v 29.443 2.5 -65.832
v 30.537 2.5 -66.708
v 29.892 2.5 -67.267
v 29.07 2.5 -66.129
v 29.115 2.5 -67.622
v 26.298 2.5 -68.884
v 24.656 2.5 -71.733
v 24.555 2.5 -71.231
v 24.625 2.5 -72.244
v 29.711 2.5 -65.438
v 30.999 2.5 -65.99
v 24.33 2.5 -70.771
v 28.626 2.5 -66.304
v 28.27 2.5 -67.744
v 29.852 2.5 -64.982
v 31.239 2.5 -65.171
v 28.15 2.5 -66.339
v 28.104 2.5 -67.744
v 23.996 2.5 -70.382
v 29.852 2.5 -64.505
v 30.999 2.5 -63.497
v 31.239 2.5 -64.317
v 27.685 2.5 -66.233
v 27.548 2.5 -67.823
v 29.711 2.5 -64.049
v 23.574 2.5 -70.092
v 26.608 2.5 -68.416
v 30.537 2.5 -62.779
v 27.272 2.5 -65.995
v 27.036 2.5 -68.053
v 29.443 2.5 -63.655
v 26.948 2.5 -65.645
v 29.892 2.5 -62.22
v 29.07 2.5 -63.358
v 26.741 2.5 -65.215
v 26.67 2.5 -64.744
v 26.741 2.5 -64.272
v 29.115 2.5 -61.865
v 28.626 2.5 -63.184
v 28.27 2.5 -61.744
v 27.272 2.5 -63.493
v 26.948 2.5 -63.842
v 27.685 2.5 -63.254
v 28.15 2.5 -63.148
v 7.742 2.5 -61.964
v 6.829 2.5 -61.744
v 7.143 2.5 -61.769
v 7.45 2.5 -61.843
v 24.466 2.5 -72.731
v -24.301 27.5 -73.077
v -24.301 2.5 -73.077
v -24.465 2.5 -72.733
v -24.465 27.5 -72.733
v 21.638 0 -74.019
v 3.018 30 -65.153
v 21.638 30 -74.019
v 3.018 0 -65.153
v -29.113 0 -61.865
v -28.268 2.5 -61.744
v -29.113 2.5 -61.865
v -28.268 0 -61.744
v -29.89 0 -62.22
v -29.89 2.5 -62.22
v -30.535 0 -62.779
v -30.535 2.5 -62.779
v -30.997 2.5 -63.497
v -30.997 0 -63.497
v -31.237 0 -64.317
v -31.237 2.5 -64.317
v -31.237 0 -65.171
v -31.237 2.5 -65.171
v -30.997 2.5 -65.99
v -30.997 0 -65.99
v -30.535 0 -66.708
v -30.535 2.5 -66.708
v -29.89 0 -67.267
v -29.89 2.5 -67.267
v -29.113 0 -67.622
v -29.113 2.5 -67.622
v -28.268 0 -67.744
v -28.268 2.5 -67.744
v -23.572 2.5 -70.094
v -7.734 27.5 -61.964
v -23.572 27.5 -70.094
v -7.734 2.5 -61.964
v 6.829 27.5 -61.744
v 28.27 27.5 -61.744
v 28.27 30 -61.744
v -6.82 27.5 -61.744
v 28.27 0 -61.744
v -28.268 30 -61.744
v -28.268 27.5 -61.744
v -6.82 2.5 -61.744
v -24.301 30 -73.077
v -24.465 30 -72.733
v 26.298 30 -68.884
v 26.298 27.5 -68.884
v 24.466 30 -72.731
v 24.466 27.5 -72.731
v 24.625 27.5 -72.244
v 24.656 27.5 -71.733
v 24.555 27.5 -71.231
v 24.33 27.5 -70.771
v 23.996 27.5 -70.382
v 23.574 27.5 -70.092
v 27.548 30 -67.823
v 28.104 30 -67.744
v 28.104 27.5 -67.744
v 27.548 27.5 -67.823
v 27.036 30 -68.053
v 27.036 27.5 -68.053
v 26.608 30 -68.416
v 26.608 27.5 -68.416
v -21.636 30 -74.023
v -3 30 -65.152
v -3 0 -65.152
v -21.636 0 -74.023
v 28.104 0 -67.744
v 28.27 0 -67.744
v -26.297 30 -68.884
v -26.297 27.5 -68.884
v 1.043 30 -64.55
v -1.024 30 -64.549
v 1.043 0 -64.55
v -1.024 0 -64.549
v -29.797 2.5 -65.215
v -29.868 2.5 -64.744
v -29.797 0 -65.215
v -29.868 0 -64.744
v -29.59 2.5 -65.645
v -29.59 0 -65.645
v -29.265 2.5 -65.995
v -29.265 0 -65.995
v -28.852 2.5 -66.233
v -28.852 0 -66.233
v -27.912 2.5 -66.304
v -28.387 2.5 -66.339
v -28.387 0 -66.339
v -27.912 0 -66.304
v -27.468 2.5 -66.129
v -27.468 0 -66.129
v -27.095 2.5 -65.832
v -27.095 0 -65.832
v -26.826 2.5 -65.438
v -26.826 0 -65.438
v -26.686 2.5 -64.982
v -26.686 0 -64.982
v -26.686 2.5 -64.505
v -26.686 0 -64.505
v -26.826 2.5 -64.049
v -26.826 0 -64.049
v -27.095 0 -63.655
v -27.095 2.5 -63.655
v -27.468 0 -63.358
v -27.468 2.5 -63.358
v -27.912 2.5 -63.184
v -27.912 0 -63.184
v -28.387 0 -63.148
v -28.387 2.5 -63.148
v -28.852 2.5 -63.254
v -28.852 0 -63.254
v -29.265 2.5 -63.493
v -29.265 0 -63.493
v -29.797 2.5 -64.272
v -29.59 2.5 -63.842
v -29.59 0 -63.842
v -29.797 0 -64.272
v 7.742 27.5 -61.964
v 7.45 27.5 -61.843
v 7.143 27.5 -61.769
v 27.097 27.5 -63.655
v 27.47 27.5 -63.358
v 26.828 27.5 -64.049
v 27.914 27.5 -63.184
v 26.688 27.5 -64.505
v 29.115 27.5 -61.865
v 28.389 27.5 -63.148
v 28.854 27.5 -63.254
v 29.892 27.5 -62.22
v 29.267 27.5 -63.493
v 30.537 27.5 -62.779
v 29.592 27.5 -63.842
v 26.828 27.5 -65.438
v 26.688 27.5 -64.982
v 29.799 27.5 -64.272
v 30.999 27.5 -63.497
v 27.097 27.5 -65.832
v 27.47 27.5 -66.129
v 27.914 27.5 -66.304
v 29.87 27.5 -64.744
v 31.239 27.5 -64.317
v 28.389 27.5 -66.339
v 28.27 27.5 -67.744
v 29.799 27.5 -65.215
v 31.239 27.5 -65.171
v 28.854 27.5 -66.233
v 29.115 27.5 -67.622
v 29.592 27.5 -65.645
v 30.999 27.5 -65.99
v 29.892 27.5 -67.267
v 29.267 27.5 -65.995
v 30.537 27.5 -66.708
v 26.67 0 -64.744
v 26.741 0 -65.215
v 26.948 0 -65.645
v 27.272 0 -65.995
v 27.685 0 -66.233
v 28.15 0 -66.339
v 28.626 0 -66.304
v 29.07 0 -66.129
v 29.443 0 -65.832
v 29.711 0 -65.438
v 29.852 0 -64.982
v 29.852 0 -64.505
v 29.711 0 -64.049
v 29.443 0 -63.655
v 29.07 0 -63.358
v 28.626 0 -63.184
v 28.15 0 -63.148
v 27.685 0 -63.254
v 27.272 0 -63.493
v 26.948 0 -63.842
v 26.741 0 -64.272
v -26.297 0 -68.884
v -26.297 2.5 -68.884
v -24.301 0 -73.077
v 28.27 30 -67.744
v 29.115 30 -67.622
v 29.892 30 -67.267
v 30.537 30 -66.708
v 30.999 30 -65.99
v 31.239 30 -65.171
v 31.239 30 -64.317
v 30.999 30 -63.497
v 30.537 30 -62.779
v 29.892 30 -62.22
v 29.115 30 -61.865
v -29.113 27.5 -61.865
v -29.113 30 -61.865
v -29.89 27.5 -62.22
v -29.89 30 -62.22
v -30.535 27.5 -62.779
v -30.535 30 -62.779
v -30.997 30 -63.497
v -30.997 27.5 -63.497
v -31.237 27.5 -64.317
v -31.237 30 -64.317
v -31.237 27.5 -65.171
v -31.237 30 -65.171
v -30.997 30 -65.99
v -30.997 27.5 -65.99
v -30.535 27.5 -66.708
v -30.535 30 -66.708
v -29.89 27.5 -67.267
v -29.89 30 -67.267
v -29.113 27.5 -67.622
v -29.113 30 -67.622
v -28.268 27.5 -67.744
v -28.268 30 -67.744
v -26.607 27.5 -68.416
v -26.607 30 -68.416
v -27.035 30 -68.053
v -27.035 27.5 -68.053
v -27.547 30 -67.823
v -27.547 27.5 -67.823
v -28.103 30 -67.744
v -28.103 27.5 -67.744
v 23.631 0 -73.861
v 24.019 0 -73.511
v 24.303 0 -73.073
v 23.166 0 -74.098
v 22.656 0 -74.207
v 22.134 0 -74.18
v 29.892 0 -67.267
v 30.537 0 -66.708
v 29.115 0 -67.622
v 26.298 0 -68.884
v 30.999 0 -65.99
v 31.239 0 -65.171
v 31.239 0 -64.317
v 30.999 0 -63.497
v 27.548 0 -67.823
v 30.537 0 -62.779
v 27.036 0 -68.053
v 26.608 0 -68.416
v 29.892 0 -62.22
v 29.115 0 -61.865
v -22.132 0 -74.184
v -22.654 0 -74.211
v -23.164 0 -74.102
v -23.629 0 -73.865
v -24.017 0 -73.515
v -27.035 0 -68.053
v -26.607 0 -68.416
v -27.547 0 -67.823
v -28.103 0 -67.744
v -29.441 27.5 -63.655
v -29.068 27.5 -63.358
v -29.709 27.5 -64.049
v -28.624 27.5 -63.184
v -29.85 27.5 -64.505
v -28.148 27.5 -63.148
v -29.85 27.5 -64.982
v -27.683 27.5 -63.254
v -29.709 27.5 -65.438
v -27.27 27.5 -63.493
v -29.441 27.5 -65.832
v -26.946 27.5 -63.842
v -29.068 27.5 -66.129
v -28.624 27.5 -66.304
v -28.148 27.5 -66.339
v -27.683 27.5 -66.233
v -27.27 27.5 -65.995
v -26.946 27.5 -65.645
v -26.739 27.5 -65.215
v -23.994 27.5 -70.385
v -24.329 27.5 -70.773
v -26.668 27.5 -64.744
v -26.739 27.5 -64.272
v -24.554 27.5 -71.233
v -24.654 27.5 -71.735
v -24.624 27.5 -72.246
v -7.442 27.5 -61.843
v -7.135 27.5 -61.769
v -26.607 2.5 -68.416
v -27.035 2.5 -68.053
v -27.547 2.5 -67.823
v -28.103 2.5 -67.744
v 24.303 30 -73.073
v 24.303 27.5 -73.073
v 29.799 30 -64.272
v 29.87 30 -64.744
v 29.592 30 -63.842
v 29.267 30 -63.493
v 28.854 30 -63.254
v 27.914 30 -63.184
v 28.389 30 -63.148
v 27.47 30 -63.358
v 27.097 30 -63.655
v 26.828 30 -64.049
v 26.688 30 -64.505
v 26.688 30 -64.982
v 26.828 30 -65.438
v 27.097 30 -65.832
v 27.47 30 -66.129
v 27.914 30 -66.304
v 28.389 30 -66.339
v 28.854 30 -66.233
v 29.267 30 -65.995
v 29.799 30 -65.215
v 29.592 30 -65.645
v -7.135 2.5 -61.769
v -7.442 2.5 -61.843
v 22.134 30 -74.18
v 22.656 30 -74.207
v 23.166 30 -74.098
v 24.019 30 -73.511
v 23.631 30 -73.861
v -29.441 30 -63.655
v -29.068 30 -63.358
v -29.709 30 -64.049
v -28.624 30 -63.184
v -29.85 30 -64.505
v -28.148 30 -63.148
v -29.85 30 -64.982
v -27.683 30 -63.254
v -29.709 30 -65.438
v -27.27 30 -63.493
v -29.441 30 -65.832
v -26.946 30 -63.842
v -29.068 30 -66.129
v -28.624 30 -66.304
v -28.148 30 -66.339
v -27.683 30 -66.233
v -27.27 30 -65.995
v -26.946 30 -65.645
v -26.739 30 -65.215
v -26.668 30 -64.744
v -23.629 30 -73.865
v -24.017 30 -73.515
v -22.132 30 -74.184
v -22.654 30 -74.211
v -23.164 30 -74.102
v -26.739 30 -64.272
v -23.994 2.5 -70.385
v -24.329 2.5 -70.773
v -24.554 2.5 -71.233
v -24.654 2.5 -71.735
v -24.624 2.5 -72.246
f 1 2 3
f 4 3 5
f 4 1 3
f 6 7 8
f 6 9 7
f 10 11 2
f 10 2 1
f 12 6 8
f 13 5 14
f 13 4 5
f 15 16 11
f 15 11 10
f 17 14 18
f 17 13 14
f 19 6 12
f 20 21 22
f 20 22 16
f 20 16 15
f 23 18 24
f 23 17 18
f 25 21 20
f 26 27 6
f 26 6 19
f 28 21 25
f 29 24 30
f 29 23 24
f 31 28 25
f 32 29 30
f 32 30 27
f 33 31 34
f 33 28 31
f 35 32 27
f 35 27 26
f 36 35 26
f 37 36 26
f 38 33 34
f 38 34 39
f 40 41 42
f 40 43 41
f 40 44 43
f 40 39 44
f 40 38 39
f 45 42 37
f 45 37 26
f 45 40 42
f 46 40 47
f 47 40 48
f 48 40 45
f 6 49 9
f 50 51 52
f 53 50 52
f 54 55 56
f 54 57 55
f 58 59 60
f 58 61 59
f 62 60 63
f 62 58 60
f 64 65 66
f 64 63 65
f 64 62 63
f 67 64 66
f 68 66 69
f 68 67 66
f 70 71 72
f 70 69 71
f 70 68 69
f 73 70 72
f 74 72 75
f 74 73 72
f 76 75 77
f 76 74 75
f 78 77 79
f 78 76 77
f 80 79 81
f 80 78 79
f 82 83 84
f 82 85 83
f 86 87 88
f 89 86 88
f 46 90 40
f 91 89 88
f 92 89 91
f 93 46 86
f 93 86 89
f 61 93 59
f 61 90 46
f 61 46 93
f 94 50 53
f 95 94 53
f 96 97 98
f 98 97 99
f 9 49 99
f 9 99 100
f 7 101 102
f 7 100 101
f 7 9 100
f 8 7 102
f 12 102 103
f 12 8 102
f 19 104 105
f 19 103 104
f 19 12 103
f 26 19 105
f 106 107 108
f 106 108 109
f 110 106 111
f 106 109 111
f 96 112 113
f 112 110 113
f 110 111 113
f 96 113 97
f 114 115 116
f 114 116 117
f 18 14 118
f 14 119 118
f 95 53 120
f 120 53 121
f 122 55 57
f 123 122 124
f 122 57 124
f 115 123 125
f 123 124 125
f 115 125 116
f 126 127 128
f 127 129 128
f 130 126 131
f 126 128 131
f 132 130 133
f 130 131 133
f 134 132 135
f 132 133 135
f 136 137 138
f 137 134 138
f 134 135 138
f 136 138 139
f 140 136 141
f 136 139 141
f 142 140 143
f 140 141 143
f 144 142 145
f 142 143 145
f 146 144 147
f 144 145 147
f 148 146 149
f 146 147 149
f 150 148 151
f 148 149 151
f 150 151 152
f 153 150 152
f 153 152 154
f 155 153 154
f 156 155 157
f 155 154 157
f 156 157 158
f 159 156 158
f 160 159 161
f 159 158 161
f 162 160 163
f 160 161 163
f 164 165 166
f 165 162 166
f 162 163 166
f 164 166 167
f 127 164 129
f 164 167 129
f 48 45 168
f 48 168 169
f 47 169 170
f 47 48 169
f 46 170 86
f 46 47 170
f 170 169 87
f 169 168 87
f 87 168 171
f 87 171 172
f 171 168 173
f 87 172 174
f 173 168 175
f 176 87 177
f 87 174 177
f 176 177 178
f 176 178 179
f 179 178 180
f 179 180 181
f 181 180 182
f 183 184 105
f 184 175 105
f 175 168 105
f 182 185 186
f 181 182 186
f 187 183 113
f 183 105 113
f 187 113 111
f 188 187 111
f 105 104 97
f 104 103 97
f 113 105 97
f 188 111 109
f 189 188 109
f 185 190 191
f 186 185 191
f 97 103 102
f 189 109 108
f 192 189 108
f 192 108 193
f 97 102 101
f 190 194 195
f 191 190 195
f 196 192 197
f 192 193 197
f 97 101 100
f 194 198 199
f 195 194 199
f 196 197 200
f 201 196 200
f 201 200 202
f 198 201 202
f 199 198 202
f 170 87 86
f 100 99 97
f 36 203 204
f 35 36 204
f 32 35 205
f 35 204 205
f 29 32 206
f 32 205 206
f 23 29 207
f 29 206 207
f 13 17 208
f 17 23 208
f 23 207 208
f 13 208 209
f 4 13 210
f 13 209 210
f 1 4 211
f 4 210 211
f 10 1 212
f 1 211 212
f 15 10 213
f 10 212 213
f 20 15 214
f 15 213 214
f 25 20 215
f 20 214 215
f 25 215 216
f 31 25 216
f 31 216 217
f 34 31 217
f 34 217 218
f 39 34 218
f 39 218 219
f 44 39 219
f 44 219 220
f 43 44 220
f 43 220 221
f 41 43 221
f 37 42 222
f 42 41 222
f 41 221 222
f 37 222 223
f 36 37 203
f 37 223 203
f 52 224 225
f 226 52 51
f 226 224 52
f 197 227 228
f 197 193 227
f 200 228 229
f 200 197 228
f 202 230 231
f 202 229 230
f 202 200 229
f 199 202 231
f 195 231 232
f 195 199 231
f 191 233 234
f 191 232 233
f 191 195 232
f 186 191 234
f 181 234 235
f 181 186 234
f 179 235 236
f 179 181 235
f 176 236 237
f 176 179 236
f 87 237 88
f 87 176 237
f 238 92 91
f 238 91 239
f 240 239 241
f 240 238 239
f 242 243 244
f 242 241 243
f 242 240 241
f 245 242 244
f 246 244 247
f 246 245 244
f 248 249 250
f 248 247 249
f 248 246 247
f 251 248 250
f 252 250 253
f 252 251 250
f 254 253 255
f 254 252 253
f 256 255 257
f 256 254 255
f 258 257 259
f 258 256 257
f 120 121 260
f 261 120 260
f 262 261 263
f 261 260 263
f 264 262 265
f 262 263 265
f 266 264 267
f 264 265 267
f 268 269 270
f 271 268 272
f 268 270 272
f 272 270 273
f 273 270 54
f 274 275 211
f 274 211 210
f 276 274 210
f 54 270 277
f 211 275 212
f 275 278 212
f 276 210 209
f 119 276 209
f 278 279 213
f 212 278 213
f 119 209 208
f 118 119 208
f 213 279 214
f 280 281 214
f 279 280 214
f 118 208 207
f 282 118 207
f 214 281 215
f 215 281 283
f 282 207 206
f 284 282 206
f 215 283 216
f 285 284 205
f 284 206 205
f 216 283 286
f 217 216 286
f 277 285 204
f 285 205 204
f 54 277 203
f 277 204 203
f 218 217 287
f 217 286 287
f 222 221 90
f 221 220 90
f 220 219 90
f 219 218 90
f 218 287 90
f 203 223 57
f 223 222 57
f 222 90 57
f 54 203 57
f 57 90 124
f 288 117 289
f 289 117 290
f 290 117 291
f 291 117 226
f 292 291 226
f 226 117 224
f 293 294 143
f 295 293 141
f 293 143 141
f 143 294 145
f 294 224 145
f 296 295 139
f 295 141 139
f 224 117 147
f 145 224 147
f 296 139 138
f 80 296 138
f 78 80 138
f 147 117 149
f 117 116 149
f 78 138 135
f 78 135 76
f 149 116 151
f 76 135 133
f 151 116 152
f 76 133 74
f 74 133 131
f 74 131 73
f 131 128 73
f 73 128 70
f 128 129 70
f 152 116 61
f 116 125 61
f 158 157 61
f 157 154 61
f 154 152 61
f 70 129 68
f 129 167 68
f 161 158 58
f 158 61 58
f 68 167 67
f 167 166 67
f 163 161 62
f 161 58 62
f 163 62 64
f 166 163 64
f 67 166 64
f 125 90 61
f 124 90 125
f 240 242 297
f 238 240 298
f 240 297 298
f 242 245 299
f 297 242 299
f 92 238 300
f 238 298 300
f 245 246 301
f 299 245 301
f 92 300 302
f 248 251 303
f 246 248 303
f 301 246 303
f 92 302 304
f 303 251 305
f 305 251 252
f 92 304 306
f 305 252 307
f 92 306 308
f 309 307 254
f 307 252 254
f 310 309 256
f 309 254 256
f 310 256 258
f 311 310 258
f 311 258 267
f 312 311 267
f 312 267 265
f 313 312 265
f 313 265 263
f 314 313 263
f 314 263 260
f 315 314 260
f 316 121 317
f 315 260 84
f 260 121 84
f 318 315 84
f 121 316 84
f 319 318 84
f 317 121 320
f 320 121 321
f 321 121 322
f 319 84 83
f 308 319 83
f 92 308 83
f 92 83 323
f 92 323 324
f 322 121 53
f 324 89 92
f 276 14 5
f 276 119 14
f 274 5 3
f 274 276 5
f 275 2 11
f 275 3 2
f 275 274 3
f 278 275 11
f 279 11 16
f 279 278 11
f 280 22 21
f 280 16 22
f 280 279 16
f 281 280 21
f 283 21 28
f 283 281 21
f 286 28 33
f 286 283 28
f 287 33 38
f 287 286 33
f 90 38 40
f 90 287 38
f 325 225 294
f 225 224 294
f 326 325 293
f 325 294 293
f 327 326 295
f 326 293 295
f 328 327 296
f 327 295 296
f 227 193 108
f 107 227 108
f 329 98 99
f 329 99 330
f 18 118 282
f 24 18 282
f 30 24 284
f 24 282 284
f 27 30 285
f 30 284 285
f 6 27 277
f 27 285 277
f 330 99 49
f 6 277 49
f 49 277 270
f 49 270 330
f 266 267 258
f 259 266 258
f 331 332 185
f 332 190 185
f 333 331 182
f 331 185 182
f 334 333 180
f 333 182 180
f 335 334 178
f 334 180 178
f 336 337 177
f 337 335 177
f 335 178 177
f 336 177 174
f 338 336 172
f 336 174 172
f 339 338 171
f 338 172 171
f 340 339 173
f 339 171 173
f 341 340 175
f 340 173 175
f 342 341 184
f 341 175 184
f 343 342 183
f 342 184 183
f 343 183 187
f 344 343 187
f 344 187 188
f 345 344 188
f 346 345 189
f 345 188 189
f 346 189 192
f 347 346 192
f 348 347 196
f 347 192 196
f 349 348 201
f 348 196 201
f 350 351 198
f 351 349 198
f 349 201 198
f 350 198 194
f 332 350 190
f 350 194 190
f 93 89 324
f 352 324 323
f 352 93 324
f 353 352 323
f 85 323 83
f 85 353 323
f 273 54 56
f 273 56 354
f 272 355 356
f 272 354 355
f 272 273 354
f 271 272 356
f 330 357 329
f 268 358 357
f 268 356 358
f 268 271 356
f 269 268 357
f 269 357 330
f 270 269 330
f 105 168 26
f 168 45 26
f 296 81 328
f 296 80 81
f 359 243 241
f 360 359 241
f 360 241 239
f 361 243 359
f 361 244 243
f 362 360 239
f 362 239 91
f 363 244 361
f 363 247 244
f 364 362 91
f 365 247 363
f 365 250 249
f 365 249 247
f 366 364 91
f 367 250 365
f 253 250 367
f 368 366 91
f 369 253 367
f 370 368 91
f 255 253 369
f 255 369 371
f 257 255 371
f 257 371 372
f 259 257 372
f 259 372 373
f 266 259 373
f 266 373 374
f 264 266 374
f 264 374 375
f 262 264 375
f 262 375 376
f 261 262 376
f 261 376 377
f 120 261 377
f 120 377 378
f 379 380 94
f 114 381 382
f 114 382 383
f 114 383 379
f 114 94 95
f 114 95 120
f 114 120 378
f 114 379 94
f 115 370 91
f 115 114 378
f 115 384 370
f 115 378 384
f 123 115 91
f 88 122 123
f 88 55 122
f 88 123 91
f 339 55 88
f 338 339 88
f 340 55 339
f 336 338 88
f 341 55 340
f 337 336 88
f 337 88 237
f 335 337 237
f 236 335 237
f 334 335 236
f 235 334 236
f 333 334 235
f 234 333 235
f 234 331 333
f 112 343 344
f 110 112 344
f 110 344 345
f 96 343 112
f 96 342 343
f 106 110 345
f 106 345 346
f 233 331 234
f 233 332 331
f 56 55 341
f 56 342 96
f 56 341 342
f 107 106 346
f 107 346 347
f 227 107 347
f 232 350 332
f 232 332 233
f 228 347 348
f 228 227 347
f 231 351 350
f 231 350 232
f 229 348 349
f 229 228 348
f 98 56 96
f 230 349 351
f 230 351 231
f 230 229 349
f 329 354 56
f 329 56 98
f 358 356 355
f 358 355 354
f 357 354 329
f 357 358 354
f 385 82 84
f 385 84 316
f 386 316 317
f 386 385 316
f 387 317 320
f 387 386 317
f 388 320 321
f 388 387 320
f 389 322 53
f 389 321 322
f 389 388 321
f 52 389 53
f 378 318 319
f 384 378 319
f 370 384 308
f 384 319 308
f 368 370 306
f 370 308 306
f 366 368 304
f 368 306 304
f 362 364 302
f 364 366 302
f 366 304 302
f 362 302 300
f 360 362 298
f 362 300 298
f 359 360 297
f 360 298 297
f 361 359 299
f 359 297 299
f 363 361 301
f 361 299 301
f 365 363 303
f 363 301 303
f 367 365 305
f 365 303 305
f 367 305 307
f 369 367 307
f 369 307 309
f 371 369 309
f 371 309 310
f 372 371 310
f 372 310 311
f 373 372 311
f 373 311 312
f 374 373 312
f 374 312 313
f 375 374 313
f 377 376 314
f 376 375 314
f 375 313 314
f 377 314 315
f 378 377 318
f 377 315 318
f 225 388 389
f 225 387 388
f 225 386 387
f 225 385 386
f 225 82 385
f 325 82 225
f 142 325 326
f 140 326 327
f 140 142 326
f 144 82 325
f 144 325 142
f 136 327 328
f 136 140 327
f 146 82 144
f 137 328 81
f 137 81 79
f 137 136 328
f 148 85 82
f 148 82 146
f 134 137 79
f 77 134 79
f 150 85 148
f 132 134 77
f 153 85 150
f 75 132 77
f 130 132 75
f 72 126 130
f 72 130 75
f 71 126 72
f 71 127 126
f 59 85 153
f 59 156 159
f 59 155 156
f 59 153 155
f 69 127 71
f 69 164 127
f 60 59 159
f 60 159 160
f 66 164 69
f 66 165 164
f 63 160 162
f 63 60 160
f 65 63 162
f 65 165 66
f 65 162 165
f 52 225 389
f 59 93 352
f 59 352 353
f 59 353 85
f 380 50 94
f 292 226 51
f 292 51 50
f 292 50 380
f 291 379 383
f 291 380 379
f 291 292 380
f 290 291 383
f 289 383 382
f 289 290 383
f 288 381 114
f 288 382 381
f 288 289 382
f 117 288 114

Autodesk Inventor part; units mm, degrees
ref_plane "YZ Plane" through (0, 0, 0) normal (1, 0, 0) x (0, 1, 0)
ref_plane "XZ Plane" through (0, 0, 0) normal (0, 1, 0) x (-1, 0, 0)
ref_plane "XY Plane" through (0, 0, 0) normal (0, 0, 1) x (1, 0, 0)
sketch "Sketch1" plane through (0, 0, 0) normal (0, 1, 0) x (-1, 0, 0)
  circle A0 centre (24, -57.282) radius 1.6
  circle A1 centre (-24, -57.282) radius 1.6
  circle A2 centre (30.6147, -73.9084) radius 1.6
  circle A3 centre (-30.6218, -73.9117) radius 1.6
  circle A4 centre (28.2679, -64.7437) radius 1.6
  circle A5 centre (-28.2698, -64.7437) radius 1.6
  line L0 (48.2265, -83.602) -> (45.2265, -83.602)
  line L1 (45.2265, -83.602) -> (45.2265, -77.602)
  line L2 (45.2265, -77.602) -> (48.2265, -77.602)
  line L3 (48.2265, -77.602) -> (48.2265, -83.602)
  line L4 (-45.2265, -83.602) -> (-48.2265, -83.602)
  line L5 (-48.2265, -83.602) -> (-48.2265, -77.602)
  line L6 (-48.2265, -77.602) -> (-45.2265, -77.602)
  line L7 (-45.2265, -77.602) -> (-45.2265, -83.602)
  line L8 (48.3297, -88.9448) -> (2.1402, -66.9582)
  line L9 (-2.1585, -66.9585) -> (-48.3297, -88.9448)
  arc A6 (2.1402, -66.9582) -> (-2.1585, -66.9585) centre (-0.0088, -71.4728) ccw
  line L10 (30.6147, -73.9084) -> (28.0518, -79.2924)
  line L11 (28.0518, -79.2924) -> (-28.0596, -79.2924)
  line L12 (-30.6218, -73.9117) -> (-28.0596, -79.2924)
  line L13 (-28.0596, -79.2924) -> (-28.9194, -77.4867)
  line L14 (28.0518, -79.2924) -> (28.9114, -77.4867)
  line L15 (2.9996, -65.1524) -> (21.6357, -74.0234)
  line L16 (-3.0185, -65.1529) -> (-21.6377, -74.0192)
  arc A7 (2.9996, -65.1524) -> (-3.0185, -65.1529) centre (-0.009, -71.4729) ccw
  line L17 (26.297, -68.8841) -> (23.4415, -74.883)
  line L18 (24.3011, -73.0771) -> (25.5905, -70.3683)
  line L19 (7.0641, -61.5496) -> (5.1533, -60.64)
  line L20 (-26.2983, -68.8839) -> (-24.3033, -73.0733)
  line L21 (-23.4434, -74.879) -> (-25.5914, -70.3683)
  line L22 (-5.1635, -60.6408) -> (-7.0717, -61.5494)
  arc A8 (5.1533, -60.64) -> (-5.1635, -60.6408) centre (-0.0043, -71.4751) ccw
  arc A9 (28.2679, -67.7437) -> (28.2679, -61.7437) centre (28.2679, -64.7437) ccw
  line L23 (28.2679, -64.7437) -> (28.2679, -61.7437) construction
  line L24 (28.2679, -64.7437) -> (31.2679, -64.7437) construction
  line L25 (28.2679, -64.7437) -> (28.2679, -67.7437) construction
  line L26 (28.2679, -61.7437) -> (7.9237, -61.7437)
  line L27 (28.2679, -67.7437) -> (28.1029, -67.7437)
  arc A10 (-28.2698, -61.7437) -> (-28.2698, -67.7437) centre (-28.2698, -64.7437) ccw
  line L28 (-28.2698, -64.7437) -> (-28.2698, -61.7437) construction
  line L29 (-28.2698, -64.7437) -> (-25.2698, -64.7437) construction
  line L30 (-28.2698, -67.7437) -> (-28.104, -67.7437)
  line L31 (-28.2698, -61.7437) -> (-7.9316, -61.7437)
  arc A11 (21.6357, -74.0234) -> (24.3011, -73.0771) centre (22.4953, -72.2175) ccw
  arc A12 (-24.3033, -73.0733) -> (-21.6377, -74.0192) centre (-22.4976, -72.2134) ccw
  arc A13 (-7.9316, -61.7437) -> (-7.0717, -61.5494) centre (-7.9316, -59.7437) ccw
  arc A14 (7.0641, -61.5496) -> (7.9237, -61.7437) centre (7.9237, -59.7437) ccw
  arc A15 (28.1029, -67.7437) -> (26.297, -68.8841) centre (28.1029, -69.7437) ccw
  arc A16 (-26.2983, -68.8839) -> (-28.104, -67.7437) centre (-28.104, -69.7437) ccw
  line L32 (28.2679, -61.7437) -> (-28.2698, -61.7437)
  point P0 (0, 0)
  dimension "d0" = 3.2
  dimension "d1" = 6
  dimension "d2" = 6
  dimension "d3" = 5
  dimension "d4" = 2
  dimension "d5" = 7
  dimension "d6" = 5
  dimension "d7" = 12
  dimension "d8" = 3
  dimension "d9" = 90
  dimension "d10" = 180
  dimension "d11" = 3
  dimension "d12" = 90
  dimension "d13" = 2
  dimension "d14" = 2
extrude "Extrusion1" add sketch "Sketch1" along normal blind 2.5 contours A7 L16 A12 L20 A16 L30 A10 L31 L32 L26 A9 L27 A15 L17 A11 L15
sketch "Sketch2" plane through (0, 2.5, 0) normal (0, 1, 0) x (1, 0, 0)
  line L0 (-24.3011, 73.0771) -> (-26.297, 68.8841) projected
  line L1 (26.2983, 68.8839) -> (24.3033, 73.0733) projected
  arc A0 (-21.6357, 74.0234) -> (-24.3011, 73.0771) centre (-22.4953, 72.2175) ccw projected
  line L2 (-24.4649, 72.7332) -> (-24.3011, 73.0771)
  arc A1 (-24.4649, 72.7332) -> (-23.5723, 70.0943) centre (-22.659, 71.8736) ccw
  line L3 (24.4662, 72.7312) -> (24.3033, 73.0733)
  arc A2 (23.5739, 70.0921) -> (24.4662, 72.7312) centre (22.6605, 71.8713) ccw
  arc A3 (24.3033, 73.0733) -> (21.6377, 74.0192) centre (22.4976, 72.2134) ccw projected
  line L4 (21.6377, 74.0192) -> (3.0185, 65.1529) projected
  line L5 (-2.9996, 65.1524) -> (-21.6357, 74.0234) projected
  arc A4 (-2.9996, 65.1524) -> (3.0185, 65.1529) centre (0.009, 71.4729) ccw projected
  line L6 (-28.2679, 61.7437) -> (28.2698, 61.7437) projected
  line L7 (7.742, 61.9645) -> (23.5739, 70.0921)
  line L8 (-7.7335, 61.9644) -> (-23.5723, 70.0943)
  line L9 (-6.8202, 61.7437) -> (6.8286, 61.7437)
  arc A5 (6.8286, 61.7437) -> (7.742, 61.9645) centre (6.8286, 63.7437) ccw
  arc A6 (-7.7335, 61.9644) -> (-6.8202, 61.7437) centre (-6.8202, 63.7437) ccw
  point P0 (0, 0)
  point P1 (-5.1533, 60.64)
  point P2 (-25.2991, 70.9806)
  point P3 (25.3008, 70.9786)
  point P4 (7.312, 61.7437)
  point P5 (-7.3035, 61.7437)
  dimension "d17" = 2
  dimension "d18" = 2
  dimension "d23" = 2
extrude "Extrusion2" add sketch "Sketch2" along normal blind 25
sketch "Sketch3" plane through (0, 27.5, 0) normal (0, 1, 0) x (1, 0, 0)
  arc A0 (23.5739, 70.0921) -> (24.4662, 72.7312) centre (22.6605, 71.8713) ccw projected
  arc A1 (28.2698, 61.7437) -> (28.2698, 67.7437) centre (28.2698, 64.7437) ccw projected
  line L0 (28.2698, 67.7437) -> (28.104, 67.7437) projected
  arc A2 (26.2983, 68.8839) -> (28.104, 67.7437) centre (28.104, 69.7437) ccw projected
  line L1 (26.2983, 68.8839) -> (24.4662, 72.7312) projected
  circle A3 centre (28.2698, 64.7437) radius 1.6 projected
  arc A4 (23.5739, 70.0921) -> (24.4662, 72.7312) centre (22.6605, 71.8713) ccw projected
  line L2 (24.4662, 72.7312) -> (24.3033, 73.0733) projected
  arc A5 (24.3033, 73.0733) -> (21.6377, 74.0192) centre (22.4976, 72.2134) ccw projected
  line L3 (21.6377, 74.0192) -> (3.0185, 65.1529) projected
  arc A6 (-2.9996, 65.1524) -> (3.0185, 65.1529) centre (0.009, 71.4729) ccw projected
  line L4 (-2.9996, 65.1524) -> (-21.6357, 74.0234) projected
  arc A7 (-21.6357, 74.0234) -> (-24.3011, 73.0771) centre (-22.4953, 72.2175) ccw projected
  line L5 (-24.3011, 73.0771) -> (-24.4649, 72.7332) projected
  arc A8 (-24.4649, 72.7332) -> (-23.5723, 70.0943) centre (-22.659, 71.8736) ccw projected
  arc A9 (-24.4649, 72.7332) -> (-23.5723, 70.0943) centre (-22.659, 71.8736) ccw projected
  line L6 (-24.4649, 72.7332) -> (-26.297, 68.8841) projected
  arc A10 (-28.1029, 67.7437) -> (-26.297, 68.8841) centre (-28.1029, 69.7437) ccw projected
  line L7 (-28.1029, 67.7437) -> (-28.2679, 67.7437) projected
  arc A11 (-28.2679, 67.7437) -> (-28.2679, 61.7437) centre (-28.2679, 64.7437) ccw projected
  circle A12 centre (-28.2679, 64.7437) radius 1.6 projected
  arc A13 (-7.7335, 61.9644) -> (-6.8202, 61.7437) centre (-6.8202, 63.7437) ccw projected
  line L8 (-7.7335, 61.9644) -> (-23.5723, 70.0943) projected
  line L9 (-28.2679, 61.7437) -> (-6.8202, 61.7437) projected
  line L10 (-23.5723, 70.0943) -> (-7.7335, 61.9644) projected
  arc A14 (-7.7335, 61.9644) -> (-6.8202, 61.7437) centre (-6.8202, 63.7437) ccw projected
  line L11 (-6.8202, 61.7437) -> (6.8286, 61.7437) projected
  arc A15 (6.8286, 61.7437) -> (7.742, 61.9645) centre (6.8286, 63.7437) ccw projected
  line L12 (7.742, 61.9645) -> (23.5739, 70.0921) projected
  arc A16 (6.8286, 61.7437) -> (7.742, 61.9645) centre (6.8286, 63.7437) ccw projected
  line L13 (6.8286, 61.7437) -> (28.2698, 61.7437) projected
  line L14 (23.5739, 70.0921) -> (7.742, 61.9645) projected
  point P0 (0, 0)
extrude "Extrusion3" add sketch "Sketch3" along normal blind 2.5
properties part number "Front guard v2"
